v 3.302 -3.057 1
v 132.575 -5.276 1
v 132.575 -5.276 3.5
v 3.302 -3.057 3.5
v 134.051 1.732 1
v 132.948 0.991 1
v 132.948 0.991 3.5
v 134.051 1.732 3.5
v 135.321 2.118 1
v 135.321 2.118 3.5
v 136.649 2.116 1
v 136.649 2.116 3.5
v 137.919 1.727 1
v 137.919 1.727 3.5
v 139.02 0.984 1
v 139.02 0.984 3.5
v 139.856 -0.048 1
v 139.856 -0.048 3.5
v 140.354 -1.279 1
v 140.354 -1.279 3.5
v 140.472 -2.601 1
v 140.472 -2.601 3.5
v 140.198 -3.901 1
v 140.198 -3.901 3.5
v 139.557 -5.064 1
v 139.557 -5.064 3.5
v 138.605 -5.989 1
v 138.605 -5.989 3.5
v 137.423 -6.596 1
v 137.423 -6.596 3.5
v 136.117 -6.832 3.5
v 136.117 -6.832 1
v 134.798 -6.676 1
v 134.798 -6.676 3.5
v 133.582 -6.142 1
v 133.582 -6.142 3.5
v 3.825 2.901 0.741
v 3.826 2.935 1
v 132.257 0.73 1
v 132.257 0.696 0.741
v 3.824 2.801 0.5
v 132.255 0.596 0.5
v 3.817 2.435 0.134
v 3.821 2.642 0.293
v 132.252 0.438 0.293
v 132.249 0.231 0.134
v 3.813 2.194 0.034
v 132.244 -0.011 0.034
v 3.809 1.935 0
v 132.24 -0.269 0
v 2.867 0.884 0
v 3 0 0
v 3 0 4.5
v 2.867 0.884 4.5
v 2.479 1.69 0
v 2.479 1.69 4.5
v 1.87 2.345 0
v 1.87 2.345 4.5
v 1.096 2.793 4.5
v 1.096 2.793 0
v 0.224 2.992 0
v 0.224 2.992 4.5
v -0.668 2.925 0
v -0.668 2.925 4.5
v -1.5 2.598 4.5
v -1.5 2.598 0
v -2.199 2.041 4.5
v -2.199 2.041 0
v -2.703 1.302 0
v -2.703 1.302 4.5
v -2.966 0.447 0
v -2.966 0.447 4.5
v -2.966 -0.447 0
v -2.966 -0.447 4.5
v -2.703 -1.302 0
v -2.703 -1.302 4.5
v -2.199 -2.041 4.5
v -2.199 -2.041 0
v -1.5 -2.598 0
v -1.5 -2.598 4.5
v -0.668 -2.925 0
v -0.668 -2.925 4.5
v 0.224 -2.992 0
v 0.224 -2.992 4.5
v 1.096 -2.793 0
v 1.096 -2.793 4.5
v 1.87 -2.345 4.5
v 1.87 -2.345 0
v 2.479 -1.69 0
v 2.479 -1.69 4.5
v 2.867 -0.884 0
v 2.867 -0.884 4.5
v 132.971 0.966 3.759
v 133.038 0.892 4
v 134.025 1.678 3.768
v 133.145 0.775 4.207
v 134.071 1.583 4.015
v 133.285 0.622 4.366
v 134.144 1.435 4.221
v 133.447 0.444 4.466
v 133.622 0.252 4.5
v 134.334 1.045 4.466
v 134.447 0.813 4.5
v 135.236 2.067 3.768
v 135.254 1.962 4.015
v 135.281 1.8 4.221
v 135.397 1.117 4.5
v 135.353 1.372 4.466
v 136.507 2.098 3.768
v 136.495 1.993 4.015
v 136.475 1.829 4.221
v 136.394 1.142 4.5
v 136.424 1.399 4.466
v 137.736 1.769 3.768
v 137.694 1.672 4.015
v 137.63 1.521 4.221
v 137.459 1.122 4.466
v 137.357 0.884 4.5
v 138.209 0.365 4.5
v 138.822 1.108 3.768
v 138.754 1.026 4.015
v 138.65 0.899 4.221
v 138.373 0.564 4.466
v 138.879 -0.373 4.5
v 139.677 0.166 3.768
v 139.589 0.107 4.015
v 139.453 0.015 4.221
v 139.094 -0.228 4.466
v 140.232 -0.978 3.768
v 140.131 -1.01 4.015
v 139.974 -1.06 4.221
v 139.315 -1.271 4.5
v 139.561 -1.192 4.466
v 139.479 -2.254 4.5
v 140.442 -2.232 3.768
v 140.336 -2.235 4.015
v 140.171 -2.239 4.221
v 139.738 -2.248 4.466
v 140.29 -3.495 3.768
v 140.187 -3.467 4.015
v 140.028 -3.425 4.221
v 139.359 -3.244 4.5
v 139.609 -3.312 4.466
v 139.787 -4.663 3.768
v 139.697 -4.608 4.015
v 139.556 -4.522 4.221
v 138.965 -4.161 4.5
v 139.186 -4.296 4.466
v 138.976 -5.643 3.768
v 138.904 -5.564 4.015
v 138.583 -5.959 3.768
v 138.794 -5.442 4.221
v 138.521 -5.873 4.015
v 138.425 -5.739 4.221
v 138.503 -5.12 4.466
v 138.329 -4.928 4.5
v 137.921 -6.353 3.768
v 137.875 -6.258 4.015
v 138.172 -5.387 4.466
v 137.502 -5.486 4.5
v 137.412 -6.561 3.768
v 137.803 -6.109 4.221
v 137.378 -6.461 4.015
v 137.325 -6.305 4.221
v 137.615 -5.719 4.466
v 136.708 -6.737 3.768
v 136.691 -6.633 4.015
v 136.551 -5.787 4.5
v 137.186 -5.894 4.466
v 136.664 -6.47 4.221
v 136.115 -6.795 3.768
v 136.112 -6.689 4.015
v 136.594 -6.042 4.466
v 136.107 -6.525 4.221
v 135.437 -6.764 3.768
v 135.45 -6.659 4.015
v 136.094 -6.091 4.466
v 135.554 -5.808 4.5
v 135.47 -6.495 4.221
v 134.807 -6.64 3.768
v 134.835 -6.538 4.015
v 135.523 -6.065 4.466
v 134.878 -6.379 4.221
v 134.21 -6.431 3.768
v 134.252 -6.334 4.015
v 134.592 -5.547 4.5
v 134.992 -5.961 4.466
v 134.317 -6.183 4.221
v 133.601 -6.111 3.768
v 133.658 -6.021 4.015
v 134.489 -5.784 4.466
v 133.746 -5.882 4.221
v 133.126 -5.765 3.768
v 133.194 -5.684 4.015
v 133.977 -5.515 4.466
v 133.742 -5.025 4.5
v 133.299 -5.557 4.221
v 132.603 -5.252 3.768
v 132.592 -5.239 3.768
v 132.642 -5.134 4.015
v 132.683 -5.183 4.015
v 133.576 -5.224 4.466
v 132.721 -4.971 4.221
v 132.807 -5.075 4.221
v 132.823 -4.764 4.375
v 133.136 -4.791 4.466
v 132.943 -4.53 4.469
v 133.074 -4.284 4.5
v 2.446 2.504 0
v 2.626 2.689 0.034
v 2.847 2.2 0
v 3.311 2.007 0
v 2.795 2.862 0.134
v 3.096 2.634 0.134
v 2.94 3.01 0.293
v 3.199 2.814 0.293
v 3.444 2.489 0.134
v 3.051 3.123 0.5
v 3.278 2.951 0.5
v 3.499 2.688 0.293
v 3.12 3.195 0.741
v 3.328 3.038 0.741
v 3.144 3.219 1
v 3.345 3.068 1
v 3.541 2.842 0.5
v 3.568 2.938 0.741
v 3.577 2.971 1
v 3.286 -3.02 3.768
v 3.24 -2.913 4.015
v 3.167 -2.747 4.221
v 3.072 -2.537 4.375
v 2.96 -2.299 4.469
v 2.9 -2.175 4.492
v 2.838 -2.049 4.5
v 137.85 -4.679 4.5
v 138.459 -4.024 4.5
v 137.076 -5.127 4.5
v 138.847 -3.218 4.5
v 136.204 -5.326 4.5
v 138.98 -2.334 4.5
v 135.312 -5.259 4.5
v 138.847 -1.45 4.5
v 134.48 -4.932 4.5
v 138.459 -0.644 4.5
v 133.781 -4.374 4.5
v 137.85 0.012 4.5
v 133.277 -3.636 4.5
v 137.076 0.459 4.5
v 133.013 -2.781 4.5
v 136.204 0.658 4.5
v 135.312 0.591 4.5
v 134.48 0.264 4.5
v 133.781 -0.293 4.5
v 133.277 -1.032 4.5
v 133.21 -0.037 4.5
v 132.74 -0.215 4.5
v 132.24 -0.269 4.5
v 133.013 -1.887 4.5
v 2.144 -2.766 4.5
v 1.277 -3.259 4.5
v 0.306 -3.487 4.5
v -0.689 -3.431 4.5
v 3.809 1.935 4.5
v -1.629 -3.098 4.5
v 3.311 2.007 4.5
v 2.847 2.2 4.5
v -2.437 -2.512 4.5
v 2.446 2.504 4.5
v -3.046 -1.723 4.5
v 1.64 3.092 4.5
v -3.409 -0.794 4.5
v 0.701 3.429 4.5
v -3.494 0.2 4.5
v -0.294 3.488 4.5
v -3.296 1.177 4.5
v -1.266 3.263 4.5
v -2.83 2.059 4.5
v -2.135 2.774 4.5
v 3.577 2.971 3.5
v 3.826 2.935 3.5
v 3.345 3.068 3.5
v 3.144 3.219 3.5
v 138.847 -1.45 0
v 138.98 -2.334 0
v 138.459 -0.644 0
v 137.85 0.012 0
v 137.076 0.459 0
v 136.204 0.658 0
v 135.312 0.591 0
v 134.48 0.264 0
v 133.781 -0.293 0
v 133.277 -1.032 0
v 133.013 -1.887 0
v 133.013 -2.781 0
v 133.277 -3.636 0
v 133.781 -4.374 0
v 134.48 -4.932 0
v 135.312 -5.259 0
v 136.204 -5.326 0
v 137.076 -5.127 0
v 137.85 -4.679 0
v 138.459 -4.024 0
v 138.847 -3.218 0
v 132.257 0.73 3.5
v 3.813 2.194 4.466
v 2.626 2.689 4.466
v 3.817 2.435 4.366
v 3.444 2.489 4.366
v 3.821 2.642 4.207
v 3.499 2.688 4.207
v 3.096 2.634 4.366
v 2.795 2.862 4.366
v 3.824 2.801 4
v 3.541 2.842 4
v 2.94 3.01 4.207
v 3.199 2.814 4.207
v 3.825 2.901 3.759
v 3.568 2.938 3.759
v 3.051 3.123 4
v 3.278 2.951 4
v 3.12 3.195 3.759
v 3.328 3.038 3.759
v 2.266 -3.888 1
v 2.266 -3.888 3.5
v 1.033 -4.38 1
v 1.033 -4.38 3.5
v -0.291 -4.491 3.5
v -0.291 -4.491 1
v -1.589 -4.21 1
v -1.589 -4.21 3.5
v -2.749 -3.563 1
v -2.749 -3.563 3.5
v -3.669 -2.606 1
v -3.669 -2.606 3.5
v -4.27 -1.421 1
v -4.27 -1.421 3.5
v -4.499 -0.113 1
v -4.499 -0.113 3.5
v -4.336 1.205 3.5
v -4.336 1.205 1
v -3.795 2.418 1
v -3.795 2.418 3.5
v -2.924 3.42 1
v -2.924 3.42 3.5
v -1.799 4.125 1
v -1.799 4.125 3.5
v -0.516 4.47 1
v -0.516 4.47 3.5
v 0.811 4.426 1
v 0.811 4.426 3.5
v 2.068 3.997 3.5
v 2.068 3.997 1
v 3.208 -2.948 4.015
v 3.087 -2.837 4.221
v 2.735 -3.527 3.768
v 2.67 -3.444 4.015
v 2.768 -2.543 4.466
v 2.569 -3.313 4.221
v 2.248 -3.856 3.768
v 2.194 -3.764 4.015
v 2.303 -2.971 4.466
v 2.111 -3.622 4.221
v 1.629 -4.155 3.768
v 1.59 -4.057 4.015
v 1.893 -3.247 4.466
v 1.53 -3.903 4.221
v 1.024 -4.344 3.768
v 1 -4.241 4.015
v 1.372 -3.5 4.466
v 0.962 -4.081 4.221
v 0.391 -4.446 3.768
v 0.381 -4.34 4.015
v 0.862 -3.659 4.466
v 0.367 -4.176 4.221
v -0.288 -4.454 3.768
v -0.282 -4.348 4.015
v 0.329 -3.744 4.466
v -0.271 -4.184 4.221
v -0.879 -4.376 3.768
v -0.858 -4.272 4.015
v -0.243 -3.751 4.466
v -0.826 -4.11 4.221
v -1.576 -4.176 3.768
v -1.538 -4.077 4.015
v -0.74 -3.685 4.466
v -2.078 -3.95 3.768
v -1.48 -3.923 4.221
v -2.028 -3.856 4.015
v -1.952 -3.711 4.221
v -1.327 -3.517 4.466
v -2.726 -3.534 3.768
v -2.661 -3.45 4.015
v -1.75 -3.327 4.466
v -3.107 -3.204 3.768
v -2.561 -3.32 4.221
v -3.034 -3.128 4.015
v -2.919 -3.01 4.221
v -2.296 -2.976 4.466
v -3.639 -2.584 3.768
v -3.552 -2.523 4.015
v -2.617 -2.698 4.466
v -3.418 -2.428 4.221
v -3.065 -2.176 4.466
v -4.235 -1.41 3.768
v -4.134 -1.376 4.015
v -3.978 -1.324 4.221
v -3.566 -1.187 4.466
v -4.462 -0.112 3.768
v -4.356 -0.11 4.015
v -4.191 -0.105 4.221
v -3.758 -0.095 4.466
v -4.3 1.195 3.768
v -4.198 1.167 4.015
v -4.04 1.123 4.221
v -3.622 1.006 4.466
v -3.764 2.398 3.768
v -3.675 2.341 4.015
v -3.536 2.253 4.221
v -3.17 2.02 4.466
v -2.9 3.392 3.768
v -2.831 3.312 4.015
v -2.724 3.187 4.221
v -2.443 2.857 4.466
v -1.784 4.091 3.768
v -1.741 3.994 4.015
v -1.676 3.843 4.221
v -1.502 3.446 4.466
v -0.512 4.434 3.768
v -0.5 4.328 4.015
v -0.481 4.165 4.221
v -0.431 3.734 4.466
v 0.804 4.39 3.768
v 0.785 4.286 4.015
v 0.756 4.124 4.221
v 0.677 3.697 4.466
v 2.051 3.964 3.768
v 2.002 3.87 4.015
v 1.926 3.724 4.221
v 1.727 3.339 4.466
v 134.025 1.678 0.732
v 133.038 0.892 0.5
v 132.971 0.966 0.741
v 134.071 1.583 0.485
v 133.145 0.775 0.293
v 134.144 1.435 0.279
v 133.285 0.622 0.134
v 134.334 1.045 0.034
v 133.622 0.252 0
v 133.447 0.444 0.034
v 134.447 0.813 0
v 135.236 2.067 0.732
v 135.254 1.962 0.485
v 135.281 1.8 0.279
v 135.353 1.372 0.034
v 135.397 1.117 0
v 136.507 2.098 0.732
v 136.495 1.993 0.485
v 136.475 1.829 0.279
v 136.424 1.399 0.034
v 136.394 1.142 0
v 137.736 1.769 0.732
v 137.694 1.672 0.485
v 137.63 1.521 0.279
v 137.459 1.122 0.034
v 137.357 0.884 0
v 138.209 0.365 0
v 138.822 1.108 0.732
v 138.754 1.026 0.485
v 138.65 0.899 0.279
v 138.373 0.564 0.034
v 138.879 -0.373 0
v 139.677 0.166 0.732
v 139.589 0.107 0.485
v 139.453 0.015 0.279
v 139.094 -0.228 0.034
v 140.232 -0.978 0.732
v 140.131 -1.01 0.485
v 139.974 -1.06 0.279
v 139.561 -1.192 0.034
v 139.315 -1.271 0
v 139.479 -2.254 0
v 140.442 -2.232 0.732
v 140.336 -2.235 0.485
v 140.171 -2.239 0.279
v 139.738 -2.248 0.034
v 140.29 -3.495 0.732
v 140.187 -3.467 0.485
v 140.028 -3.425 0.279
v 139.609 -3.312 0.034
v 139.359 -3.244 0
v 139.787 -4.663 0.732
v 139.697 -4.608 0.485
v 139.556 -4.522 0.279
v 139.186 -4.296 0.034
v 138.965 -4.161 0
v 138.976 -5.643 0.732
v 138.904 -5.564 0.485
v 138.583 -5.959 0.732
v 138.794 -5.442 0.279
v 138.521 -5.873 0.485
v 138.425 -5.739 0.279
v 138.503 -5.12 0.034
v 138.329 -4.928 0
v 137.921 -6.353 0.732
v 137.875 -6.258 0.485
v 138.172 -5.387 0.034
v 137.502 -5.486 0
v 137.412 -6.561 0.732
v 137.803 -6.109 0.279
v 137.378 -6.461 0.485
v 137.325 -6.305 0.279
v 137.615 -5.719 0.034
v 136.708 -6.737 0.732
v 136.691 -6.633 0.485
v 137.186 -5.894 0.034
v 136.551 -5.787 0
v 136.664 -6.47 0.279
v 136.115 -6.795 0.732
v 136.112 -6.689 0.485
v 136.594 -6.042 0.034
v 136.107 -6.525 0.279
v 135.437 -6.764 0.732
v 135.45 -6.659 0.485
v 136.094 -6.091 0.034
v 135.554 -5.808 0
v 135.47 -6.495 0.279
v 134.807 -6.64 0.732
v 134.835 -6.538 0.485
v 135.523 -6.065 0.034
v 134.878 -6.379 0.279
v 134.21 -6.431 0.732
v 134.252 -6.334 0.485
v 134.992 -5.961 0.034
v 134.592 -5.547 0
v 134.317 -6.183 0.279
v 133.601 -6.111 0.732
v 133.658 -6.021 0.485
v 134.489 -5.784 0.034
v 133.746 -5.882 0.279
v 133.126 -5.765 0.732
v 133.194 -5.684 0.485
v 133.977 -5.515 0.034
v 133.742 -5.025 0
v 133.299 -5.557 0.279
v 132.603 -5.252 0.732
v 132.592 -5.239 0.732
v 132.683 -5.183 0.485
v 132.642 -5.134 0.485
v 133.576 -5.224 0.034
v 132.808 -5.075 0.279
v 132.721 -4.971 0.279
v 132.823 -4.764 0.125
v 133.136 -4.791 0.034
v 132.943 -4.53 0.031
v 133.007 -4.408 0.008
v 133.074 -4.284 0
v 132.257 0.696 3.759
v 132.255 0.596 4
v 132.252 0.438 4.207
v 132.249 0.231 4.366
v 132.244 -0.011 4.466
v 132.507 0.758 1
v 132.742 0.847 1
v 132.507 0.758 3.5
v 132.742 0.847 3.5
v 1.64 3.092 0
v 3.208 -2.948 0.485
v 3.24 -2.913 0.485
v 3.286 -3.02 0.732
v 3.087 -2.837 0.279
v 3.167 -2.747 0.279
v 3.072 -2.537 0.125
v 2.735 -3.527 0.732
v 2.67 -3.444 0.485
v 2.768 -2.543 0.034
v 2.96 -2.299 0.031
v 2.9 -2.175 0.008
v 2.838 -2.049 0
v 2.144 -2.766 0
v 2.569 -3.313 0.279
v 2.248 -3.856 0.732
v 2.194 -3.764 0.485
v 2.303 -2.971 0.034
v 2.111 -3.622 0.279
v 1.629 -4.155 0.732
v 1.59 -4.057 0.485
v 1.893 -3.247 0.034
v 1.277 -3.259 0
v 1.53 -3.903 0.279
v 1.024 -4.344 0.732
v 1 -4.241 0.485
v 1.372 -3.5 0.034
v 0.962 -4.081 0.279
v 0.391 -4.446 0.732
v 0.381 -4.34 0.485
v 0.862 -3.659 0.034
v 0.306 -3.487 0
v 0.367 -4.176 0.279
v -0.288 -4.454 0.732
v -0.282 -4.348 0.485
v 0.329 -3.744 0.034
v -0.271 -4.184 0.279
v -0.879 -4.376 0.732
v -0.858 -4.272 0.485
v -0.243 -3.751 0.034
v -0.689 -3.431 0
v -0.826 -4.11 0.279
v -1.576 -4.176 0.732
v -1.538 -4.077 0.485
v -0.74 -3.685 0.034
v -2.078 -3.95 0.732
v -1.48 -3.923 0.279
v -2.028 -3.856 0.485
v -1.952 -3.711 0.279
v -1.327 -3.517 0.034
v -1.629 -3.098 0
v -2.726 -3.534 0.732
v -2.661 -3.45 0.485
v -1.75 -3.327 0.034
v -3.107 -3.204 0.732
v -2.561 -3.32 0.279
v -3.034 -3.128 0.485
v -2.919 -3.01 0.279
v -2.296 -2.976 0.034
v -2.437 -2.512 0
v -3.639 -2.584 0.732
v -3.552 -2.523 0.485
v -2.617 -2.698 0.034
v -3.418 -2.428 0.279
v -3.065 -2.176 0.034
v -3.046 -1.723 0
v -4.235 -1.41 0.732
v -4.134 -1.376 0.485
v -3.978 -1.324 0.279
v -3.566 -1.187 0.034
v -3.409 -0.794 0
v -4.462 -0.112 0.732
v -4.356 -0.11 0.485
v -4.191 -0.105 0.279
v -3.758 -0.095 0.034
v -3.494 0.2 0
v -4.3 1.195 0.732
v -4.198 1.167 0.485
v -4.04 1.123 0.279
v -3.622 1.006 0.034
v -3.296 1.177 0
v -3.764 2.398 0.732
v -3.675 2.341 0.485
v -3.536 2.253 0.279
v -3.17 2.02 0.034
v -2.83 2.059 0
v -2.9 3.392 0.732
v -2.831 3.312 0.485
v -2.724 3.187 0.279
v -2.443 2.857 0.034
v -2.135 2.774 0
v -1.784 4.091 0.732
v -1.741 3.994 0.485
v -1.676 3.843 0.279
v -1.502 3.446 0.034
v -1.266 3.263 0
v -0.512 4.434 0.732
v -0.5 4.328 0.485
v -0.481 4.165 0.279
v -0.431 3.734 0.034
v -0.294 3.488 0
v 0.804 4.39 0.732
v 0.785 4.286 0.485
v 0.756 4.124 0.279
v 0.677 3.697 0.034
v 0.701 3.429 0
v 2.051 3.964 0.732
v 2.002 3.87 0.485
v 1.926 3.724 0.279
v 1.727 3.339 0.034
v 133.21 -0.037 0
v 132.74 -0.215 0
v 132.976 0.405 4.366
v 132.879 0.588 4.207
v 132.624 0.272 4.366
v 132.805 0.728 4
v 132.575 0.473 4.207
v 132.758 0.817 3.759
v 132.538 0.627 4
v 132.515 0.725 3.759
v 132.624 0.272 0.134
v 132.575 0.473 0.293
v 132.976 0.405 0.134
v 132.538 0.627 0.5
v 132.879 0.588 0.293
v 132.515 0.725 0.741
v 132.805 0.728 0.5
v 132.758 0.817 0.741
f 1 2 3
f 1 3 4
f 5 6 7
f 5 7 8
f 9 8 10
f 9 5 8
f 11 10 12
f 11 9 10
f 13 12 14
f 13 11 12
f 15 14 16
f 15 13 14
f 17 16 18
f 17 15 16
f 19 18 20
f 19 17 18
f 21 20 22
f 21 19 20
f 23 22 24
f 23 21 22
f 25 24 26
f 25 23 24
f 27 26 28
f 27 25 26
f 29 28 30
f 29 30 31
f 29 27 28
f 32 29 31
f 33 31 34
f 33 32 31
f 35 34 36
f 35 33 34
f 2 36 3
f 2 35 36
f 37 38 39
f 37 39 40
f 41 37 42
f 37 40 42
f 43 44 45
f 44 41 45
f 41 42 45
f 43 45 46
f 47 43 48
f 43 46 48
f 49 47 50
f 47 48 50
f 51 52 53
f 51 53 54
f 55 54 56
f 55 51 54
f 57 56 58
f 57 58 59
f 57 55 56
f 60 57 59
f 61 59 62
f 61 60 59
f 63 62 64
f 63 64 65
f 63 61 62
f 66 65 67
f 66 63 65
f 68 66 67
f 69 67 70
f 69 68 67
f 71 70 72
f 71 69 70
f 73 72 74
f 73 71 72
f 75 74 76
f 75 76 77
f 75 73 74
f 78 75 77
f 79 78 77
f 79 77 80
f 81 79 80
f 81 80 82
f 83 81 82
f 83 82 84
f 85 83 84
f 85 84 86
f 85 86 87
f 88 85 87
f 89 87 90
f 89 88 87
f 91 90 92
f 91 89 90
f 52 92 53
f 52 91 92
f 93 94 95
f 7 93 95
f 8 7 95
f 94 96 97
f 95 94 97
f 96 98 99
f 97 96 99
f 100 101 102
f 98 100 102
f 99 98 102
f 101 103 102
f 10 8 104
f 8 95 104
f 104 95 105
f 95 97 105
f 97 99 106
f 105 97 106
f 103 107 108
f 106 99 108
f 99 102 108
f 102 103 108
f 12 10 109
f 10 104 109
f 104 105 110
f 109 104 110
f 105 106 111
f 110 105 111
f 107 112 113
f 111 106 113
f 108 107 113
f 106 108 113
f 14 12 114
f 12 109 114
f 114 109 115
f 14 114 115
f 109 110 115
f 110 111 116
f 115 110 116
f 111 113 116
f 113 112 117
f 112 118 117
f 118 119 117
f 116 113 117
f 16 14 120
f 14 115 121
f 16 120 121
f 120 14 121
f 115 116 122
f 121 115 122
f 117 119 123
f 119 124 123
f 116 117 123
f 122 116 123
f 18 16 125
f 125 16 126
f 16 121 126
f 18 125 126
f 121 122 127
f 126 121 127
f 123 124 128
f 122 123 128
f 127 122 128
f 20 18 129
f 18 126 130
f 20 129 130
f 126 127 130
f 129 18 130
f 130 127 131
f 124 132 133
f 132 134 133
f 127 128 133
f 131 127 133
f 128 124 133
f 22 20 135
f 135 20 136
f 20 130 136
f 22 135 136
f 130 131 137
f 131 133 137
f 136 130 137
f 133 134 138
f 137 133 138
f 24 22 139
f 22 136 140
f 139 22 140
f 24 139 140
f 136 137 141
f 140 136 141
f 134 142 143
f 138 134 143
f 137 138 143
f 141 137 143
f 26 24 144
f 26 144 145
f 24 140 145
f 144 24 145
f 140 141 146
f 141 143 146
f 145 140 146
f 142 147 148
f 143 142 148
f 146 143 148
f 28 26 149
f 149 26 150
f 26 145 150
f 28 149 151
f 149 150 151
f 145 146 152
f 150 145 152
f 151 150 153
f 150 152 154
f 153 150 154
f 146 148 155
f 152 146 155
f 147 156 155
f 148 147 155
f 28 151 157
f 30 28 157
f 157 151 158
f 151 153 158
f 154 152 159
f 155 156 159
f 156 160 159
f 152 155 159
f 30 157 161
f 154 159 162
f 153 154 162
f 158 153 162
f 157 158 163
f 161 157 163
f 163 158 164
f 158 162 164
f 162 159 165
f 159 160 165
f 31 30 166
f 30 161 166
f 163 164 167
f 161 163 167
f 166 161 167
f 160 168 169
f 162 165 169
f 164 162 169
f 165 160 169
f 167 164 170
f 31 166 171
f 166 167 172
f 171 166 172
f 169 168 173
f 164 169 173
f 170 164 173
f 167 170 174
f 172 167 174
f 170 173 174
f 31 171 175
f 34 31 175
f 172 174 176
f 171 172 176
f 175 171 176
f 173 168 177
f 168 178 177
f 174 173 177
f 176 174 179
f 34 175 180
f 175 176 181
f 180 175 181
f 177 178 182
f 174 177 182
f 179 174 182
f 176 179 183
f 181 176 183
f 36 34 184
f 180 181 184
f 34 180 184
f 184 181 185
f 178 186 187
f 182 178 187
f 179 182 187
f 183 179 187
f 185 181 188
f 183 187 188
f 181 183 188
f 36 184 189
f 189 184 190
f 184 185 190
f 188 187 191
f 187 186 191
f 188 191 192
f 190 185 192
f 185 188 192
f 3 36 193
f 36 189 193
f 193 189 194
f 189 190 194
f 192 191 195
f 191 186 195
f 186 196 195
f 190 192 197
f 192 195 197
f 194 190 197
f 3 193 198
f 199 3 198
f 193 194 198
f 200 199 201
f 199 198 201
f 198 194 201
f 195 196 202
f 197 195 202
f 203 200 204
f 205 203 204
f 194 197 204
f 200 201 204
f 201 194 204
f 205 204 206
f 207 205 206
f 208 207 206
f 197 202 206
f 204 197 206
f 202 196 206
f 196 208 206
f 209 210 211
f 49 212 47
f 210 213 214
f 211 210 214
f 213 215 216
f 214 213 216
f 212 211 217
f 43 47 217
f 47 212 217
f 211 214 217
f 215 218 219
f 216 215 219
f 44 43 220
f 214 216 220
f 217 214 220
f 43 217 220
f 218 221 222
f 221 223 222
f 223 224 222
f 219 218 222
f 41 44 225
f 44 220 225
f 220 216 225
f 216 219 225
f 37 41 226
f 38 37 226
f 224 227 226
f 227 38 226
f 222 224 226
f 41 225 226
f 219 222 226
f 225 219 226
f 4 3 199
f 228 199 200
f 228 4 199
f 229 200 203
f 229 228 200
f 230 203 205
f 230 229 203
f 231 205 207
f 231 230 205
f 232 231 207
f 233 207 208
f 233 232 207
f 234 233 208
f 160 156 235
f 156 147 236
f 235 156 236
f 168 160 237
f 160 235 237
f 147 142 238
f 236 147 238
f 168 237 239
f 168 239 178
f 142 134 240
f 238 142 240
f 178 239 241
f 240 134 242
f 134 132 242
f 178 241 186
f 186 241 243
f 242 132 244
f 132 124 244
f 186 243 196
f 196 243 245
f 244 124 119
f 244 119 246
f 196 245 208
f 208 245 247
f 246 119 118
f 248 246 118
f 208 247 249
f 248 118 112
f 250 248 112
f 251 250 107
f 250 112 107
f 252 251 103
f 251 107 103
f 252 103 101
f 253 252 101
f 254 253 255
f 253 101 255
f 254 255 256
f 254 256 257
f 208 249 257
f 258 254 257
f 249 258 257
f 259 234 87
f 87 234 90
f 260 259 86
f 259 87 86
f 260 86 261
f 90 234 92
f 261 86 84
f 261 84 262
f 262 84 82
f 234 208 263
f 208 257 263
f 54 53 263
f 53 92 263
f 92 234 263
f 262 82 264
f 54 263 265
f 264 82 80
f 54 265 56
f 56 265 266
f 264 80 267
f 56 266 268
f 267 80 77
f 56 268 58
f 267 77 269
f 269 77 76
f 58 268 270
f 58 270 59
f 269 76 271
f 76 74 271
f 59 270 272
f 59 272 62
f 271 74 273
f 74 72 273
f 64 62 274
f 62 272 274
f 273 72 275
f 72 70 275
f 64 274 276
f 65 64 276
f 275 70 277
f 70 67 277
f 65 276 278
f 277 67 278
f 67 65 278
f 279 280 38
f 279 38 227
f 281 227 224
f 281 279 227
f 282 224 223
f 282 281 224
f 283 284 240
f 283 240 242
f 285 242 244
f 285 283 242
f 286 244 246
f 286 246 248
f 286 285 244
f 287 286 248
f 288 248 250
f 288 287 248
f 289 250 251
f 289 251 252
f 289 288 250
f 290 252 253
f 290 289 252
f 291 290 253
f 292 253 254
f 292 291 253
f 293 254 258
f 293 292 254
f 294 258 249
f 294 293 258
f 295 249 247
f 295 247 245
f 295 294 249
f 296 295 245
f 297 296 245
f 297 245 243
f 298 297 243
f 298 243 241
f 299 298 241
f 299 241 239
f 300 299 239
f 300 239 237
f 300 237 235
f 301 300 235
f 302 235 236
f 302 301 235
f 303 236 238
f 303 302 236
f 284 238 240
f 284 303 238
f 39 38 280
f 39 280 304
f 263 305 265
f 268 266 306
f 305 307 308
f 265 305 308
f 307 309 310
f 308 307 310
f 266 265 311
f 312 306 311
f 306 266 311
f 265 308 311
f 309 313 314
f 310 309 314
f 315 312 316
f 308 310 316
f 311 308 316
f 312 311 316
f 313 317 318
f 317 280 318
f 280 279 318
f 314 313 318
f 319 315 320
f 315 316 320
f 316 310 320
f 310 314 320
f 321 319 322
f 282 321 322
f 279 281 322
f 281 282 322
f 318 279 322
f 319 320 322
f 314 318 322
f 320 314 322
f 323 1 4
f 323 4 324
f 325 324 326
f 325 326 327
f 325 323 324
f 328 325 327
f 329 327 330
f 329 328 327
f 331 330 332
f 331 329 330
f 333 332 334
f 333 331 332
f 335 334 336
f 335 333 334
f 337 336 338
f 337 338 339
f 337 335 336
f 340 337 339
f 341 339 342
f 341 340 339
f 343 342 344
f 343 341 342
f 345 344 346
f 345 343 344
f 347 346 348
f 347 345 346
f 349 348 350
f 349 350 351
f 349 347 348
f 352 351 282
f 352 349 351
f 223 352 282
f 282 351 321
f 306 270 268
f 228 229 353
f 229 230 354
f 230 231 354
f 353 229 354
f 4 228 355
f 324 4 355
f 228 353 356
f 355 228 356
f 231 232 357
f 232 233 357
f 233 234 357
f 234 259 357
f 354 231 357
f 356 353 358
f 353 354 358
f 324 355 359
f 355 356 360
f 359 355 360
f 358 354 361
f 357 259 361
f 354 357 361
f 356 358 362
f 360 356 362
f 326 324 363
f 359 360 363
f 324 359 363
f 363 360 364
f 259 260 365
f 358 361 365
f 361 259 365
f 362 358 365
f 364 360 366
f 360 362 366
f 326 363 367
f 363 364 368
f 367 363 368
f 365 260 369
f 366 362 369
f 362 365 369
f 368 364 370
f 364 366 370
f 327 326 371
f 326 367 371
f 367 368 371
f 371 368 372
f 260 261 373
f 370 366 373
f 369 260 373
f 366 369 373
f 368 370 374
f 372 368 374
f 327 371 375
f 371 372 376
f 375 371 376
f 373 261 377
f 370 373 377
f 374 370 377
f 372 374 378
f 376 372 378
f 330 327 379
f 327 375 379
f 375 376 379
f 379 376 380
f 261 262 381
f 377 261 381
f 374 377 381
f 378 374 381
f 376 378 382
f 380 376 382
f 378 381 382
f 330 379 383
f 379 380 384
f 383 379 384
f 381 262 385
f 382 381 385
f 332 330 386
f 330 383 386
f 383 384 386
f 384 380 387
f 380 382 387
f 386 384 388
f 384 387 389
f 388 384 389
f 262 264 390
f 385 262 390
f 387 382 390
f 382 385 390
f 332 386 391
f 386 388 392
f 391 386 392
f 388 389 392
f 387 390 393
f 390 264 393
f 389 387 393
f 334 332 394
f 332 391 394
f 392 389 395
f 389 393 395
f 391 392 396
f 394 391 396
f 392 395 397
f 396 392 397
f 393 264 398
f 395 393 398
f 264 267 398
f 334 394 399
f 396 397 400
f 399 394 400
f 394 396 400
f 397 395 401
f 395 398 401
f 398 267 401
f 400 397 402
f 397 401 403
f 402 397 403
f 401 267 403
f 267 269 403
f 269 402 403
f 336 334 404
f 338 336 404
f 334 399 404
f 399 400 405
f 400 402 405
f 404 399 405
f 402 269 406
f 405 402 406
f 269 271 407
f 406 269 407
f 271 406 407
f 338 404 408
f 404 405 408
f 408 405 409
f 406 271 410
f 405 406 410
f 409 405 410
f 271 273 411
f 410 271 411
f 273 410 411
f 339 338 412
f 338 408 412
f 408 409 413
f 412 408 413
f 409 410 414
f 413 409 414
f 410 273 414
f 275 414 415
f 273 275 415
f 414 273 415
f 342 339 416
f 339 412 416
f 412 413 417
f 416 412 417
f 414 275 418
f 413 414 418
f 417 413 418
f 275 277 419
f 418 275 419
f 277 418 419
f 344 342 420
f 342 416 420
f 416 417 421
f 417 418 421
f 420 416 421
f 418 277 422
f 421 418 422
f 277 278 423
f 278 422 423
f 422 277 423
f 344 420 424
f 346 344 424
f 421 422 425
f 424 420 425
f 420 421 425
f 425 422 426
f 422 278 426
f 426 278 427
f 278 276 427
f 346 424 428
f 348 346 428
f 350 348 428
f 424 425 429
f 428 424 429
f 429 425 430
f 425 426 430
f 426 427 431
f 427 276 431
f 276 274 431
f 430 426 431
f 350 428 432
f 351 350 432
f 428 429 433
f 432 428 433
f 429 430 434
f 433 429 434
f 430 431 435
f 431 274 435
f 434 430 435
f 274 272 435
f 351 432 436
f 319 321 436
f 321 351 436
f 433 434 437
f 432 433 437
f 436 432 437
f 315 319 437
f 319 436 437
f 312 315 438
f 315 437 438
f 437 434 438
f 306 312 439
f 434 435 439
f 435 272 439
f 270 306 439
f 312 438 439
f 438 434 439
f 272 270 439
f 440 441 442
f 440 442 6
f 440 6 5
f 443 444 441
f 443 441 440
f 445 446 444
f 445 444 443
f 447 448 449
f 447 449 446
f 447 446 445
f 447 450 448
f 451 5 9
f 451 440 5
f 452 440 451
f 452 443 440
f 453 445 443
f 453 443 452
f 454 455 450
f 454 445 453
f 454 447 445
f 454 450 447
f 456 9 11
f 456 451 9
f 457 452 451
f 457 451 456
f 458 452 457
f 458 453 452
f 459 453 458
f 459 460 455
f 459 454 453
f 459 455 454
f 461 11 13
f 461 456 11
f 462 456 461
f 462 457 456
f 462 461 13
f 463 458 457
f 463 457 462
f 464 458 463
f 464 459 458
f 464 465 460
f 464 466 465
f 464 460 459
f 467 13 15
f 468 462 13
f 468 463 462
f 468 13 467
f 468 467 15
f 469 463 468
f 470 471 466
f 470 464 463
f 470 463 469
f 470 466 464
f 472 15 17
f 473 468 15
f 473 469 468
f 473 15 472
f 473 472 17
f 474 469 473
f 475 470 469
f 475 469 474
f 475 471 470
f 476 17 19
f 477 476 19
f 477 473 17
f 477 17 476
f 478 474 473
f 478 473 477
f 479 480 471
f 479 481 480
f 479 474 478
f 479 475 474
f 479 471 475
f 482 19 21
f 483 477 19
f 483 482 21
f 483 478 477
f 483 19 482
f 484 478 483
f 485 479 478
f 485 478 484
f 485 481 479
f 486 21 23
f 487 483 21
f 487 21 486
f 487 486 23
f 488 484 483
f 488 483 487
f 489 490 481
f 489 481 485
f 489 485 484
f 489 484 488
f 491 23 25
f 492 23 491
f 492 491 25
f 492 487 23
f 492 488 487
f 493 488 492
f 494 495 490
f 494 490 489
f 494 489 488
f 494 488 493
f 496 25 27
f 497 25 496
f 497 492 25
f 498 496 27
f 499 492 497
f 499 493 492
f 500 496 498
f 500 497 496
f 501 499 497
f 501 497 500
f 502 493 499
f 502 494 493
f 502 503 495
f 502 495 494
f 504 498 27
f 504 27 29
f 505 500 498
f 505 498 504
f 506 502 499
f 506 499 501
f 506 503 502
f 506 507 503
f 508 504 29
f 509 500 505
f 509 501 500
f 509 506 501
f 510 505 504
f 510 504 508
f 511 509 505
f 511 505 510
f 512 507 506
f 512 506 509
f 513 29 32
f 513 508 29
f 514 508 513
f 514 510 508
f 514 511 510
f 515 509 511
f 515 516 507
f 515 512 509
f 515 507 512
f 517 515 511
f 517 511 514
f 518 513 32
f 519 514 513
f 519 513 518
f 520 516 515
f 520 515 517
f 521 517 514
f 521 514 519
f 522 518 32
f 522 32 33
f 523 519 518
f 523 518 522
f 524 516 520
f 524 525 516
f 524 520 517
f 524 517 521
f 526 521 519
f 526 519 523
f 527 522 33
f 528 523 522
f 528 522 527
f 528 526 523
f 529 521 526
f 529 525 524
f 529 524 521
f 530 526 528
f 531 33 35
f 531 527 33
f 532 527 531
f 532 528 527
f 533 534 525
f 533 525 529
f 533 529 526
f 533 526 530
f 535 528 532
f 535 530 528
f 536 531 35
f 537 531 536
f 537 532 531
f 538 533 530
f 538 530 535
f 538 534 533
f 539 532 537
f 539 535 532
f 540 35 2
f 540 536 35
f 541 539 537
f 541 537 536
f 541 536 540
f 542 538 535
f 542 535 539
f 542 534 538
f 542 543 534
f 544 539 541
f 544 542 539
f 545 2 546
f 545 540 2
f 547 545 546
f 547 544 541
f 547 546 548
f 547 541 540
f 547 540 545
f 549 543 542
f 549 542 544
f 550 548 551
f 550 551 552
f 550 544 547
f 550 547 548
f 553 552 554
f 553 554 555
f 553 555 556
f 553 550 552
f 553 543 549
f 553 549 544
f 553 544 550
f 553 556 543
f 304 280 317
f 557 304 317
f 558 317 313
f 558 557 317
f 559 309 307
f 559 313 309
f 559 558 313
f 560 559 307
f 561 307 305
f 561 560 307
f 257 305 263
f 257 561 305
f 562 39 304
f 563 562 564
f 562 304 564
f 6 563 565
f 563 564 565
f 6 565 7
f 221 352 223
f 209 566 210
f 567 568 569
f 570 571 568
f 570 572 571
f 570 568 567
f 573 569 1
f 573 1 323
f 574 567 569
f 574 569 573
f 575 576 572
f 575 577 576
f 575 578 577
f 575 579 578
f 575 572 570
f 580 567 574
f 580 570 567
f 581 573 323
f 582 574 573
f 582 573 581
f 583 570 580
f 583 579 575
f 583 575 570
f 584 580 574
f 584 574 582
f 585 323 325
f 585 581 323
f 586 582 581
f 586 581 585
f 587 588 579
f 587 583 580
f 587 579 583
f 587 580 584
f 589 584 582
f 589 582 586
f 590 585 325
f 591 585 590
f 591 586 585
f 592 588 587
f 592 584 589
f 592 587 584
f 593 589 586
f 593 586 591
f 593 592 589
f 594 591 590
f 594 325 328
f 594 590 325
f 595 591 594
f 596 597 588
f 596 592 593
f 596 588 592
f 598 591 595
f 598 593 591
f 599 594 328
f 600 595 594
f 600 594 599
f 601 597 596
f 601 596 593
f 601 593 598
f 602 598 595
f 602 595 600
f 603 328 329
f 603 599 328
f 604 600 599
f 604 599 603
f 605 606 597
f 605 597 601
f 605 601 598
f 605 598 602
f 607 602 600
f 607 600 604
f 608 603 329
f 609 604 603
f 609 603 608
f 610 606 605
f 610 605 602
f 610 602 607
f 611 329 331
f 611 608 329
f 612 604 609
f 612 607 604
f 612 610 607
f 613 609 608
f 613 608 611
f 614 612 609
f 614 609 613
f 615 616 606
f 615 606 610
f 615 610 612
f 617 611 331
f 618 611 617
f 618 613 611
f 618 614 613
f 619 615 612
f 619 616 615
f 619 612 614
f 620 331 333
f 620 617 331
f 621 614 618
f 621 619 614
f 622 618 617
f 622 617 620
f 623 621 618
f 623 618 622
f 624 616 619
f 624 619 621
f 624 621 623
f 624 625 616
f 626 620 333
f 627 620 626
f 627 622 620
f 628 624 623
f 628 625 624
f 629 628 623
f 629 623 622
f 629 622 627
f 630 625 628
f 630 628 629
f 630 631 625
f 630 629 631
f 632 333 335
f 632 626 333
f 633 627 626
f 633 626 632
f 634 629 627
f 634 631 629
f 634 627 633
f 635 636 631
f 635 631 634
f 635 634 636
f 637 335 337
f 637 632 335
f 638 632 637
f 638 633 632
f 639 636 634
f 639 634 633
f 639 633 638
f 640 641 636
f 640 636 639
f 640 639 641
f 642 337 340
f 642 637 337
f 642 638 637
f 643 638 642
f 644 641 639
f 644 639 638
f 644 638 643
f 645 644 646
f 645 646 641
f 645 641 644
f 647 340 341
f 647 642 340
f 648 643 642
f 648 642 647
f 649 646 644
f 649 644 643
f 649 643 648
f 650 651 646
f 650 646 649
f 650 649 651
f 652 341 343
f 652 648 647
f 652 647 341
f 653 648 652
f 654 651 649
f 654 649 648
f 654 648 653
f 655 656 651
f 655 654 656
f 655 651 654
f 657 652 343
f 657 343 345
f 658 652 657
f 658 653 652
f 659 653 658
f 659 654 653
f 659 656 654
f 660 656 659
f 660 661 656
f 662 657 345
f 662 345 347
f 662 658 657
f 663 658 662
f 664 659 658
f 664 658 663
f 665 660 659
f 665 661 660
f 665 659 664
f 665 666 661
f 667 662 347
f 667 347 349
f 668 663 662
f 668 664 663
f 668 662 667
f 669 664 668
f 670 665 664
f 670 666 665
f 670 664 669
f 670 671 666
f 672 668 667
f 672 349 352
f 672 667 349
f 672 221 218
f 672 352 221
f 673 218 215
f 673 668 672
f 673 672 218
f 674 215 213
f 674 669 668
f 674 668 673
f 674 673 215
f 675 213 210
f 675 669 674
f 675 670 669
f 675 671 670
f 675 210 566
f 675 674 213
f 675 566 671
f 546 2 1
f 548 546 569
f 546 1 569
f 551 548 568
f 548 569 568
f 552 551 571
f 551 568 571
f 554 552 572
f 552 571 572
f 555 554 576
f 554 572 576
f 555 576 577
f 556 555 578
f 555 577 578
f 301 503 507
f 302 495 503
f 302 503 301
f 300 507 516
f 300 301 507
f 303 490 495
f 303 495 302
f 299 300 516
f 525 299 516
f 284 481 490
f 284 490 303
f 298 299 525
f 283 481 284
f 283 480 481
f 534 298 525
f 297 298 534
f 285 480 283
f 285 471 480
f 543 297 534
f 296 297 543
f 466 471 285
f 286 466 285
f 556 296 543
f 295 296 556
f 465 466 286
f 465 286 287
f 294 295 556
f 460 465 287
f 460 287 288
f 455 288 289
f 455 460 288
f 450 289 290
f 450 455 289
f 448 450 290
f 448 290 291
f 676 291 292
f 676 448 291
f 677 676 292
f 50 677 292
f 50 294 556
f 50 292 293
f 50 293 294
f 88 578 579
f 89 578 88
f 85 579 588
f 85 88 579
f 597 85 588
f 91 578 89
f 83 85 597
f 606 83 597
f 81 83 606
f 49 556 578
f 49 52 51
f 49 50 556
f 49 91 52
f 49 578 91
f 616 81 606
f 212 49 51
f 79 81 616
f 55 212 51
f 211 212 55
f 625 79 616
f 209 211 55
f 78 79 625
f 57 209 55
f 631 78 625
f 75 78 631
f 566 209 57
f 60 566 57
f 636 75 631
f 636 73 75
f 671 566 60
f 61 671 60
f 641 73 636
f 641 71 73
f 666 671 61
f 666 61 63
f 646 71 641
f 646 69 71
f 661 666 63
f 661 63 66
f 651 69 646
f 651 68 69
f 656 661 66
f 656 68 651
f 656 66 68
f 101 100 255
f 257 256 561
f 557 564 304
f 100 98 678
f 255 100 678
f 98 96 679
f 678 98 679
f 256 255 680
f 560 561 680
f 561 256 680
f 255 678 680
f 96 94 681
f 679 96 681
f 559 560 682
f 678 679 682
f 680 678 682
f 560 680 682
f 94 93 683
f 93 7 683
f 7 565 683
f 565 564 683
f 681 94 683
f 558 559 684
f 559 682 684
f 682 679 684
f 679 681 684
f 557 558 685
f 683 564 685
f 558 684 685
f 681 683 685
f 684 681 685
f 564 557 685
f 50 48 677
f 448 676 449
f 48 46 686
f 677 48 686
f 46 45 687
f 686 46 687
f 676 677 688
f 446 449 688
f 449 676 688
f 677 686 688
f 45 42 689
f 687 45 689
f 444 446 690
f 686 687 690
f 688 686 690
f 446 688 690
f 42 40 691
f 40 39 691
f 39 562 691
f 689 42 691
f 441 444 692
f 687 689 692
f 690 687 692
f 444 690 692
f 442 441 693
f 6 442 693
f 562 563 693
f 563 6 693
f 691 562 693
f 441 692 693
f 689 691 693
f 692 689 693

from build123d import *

# Parameters (mm, degrees)
SKETCH1_R           = 3
BOSS_EXTRUDE1_DEPTH = 4.5
FILLET3_R           = 1


with BuildPart() as part:
    # Sketch1 → Boss-Extrude1 (new body)
    with BuildSketch(Plane.XY):
        with BuildLine():
            Line((3.405090972, 2.94199855), (132.677847476, 0.723224952))
            ThreePointArc((132.677847476, 0.723224952), (140.479309911, -2.411117334), (132.574881611, -5.275891486))
            Line((132.574881611, -5.275891486), (3.302125107, -3.057117887))
            ThreePointArc((3.302125107, -3.057117887), (-4.499337328, 0.077224399), (3.405090972, 2.94199855))
        make_face()
        Circle(SKETCH1_R, mode=Mode.SUBTRACT)
        with Locations((135.979972583, -2.333892935)):
            Circle(SKETCH1_R, mode=Mode.SUBTRACT)
    extrude(amount=BOSS_EXTRUDE1_DEPTH)

    # Fillet3
    fillet3_edges = [part.edges().sort_by_distance(p)[0] for p in [
        (3.405090972, 2.94199855, 2.25),
        (132.677847476, 0.723224952, 2.25),
        (67.938503359, -4.166504686, 4.5),
        (140.479309911, -2.411117334, 4.5),
        (68.041469224, 1.832611751, 4.5),
        (-4.499337328, 0.077224399, 4.5),
        (-4.499337328, 0.077224399, 0),
        (68.041469224, 1.832611751, 0),
        (140.479309911, -2.411117334, 0),
        (67.938503359, -4.166504686, 0),
    ]]
    fillet(fillet3_edges, radius=FILLET3_R)


solid = part.part
